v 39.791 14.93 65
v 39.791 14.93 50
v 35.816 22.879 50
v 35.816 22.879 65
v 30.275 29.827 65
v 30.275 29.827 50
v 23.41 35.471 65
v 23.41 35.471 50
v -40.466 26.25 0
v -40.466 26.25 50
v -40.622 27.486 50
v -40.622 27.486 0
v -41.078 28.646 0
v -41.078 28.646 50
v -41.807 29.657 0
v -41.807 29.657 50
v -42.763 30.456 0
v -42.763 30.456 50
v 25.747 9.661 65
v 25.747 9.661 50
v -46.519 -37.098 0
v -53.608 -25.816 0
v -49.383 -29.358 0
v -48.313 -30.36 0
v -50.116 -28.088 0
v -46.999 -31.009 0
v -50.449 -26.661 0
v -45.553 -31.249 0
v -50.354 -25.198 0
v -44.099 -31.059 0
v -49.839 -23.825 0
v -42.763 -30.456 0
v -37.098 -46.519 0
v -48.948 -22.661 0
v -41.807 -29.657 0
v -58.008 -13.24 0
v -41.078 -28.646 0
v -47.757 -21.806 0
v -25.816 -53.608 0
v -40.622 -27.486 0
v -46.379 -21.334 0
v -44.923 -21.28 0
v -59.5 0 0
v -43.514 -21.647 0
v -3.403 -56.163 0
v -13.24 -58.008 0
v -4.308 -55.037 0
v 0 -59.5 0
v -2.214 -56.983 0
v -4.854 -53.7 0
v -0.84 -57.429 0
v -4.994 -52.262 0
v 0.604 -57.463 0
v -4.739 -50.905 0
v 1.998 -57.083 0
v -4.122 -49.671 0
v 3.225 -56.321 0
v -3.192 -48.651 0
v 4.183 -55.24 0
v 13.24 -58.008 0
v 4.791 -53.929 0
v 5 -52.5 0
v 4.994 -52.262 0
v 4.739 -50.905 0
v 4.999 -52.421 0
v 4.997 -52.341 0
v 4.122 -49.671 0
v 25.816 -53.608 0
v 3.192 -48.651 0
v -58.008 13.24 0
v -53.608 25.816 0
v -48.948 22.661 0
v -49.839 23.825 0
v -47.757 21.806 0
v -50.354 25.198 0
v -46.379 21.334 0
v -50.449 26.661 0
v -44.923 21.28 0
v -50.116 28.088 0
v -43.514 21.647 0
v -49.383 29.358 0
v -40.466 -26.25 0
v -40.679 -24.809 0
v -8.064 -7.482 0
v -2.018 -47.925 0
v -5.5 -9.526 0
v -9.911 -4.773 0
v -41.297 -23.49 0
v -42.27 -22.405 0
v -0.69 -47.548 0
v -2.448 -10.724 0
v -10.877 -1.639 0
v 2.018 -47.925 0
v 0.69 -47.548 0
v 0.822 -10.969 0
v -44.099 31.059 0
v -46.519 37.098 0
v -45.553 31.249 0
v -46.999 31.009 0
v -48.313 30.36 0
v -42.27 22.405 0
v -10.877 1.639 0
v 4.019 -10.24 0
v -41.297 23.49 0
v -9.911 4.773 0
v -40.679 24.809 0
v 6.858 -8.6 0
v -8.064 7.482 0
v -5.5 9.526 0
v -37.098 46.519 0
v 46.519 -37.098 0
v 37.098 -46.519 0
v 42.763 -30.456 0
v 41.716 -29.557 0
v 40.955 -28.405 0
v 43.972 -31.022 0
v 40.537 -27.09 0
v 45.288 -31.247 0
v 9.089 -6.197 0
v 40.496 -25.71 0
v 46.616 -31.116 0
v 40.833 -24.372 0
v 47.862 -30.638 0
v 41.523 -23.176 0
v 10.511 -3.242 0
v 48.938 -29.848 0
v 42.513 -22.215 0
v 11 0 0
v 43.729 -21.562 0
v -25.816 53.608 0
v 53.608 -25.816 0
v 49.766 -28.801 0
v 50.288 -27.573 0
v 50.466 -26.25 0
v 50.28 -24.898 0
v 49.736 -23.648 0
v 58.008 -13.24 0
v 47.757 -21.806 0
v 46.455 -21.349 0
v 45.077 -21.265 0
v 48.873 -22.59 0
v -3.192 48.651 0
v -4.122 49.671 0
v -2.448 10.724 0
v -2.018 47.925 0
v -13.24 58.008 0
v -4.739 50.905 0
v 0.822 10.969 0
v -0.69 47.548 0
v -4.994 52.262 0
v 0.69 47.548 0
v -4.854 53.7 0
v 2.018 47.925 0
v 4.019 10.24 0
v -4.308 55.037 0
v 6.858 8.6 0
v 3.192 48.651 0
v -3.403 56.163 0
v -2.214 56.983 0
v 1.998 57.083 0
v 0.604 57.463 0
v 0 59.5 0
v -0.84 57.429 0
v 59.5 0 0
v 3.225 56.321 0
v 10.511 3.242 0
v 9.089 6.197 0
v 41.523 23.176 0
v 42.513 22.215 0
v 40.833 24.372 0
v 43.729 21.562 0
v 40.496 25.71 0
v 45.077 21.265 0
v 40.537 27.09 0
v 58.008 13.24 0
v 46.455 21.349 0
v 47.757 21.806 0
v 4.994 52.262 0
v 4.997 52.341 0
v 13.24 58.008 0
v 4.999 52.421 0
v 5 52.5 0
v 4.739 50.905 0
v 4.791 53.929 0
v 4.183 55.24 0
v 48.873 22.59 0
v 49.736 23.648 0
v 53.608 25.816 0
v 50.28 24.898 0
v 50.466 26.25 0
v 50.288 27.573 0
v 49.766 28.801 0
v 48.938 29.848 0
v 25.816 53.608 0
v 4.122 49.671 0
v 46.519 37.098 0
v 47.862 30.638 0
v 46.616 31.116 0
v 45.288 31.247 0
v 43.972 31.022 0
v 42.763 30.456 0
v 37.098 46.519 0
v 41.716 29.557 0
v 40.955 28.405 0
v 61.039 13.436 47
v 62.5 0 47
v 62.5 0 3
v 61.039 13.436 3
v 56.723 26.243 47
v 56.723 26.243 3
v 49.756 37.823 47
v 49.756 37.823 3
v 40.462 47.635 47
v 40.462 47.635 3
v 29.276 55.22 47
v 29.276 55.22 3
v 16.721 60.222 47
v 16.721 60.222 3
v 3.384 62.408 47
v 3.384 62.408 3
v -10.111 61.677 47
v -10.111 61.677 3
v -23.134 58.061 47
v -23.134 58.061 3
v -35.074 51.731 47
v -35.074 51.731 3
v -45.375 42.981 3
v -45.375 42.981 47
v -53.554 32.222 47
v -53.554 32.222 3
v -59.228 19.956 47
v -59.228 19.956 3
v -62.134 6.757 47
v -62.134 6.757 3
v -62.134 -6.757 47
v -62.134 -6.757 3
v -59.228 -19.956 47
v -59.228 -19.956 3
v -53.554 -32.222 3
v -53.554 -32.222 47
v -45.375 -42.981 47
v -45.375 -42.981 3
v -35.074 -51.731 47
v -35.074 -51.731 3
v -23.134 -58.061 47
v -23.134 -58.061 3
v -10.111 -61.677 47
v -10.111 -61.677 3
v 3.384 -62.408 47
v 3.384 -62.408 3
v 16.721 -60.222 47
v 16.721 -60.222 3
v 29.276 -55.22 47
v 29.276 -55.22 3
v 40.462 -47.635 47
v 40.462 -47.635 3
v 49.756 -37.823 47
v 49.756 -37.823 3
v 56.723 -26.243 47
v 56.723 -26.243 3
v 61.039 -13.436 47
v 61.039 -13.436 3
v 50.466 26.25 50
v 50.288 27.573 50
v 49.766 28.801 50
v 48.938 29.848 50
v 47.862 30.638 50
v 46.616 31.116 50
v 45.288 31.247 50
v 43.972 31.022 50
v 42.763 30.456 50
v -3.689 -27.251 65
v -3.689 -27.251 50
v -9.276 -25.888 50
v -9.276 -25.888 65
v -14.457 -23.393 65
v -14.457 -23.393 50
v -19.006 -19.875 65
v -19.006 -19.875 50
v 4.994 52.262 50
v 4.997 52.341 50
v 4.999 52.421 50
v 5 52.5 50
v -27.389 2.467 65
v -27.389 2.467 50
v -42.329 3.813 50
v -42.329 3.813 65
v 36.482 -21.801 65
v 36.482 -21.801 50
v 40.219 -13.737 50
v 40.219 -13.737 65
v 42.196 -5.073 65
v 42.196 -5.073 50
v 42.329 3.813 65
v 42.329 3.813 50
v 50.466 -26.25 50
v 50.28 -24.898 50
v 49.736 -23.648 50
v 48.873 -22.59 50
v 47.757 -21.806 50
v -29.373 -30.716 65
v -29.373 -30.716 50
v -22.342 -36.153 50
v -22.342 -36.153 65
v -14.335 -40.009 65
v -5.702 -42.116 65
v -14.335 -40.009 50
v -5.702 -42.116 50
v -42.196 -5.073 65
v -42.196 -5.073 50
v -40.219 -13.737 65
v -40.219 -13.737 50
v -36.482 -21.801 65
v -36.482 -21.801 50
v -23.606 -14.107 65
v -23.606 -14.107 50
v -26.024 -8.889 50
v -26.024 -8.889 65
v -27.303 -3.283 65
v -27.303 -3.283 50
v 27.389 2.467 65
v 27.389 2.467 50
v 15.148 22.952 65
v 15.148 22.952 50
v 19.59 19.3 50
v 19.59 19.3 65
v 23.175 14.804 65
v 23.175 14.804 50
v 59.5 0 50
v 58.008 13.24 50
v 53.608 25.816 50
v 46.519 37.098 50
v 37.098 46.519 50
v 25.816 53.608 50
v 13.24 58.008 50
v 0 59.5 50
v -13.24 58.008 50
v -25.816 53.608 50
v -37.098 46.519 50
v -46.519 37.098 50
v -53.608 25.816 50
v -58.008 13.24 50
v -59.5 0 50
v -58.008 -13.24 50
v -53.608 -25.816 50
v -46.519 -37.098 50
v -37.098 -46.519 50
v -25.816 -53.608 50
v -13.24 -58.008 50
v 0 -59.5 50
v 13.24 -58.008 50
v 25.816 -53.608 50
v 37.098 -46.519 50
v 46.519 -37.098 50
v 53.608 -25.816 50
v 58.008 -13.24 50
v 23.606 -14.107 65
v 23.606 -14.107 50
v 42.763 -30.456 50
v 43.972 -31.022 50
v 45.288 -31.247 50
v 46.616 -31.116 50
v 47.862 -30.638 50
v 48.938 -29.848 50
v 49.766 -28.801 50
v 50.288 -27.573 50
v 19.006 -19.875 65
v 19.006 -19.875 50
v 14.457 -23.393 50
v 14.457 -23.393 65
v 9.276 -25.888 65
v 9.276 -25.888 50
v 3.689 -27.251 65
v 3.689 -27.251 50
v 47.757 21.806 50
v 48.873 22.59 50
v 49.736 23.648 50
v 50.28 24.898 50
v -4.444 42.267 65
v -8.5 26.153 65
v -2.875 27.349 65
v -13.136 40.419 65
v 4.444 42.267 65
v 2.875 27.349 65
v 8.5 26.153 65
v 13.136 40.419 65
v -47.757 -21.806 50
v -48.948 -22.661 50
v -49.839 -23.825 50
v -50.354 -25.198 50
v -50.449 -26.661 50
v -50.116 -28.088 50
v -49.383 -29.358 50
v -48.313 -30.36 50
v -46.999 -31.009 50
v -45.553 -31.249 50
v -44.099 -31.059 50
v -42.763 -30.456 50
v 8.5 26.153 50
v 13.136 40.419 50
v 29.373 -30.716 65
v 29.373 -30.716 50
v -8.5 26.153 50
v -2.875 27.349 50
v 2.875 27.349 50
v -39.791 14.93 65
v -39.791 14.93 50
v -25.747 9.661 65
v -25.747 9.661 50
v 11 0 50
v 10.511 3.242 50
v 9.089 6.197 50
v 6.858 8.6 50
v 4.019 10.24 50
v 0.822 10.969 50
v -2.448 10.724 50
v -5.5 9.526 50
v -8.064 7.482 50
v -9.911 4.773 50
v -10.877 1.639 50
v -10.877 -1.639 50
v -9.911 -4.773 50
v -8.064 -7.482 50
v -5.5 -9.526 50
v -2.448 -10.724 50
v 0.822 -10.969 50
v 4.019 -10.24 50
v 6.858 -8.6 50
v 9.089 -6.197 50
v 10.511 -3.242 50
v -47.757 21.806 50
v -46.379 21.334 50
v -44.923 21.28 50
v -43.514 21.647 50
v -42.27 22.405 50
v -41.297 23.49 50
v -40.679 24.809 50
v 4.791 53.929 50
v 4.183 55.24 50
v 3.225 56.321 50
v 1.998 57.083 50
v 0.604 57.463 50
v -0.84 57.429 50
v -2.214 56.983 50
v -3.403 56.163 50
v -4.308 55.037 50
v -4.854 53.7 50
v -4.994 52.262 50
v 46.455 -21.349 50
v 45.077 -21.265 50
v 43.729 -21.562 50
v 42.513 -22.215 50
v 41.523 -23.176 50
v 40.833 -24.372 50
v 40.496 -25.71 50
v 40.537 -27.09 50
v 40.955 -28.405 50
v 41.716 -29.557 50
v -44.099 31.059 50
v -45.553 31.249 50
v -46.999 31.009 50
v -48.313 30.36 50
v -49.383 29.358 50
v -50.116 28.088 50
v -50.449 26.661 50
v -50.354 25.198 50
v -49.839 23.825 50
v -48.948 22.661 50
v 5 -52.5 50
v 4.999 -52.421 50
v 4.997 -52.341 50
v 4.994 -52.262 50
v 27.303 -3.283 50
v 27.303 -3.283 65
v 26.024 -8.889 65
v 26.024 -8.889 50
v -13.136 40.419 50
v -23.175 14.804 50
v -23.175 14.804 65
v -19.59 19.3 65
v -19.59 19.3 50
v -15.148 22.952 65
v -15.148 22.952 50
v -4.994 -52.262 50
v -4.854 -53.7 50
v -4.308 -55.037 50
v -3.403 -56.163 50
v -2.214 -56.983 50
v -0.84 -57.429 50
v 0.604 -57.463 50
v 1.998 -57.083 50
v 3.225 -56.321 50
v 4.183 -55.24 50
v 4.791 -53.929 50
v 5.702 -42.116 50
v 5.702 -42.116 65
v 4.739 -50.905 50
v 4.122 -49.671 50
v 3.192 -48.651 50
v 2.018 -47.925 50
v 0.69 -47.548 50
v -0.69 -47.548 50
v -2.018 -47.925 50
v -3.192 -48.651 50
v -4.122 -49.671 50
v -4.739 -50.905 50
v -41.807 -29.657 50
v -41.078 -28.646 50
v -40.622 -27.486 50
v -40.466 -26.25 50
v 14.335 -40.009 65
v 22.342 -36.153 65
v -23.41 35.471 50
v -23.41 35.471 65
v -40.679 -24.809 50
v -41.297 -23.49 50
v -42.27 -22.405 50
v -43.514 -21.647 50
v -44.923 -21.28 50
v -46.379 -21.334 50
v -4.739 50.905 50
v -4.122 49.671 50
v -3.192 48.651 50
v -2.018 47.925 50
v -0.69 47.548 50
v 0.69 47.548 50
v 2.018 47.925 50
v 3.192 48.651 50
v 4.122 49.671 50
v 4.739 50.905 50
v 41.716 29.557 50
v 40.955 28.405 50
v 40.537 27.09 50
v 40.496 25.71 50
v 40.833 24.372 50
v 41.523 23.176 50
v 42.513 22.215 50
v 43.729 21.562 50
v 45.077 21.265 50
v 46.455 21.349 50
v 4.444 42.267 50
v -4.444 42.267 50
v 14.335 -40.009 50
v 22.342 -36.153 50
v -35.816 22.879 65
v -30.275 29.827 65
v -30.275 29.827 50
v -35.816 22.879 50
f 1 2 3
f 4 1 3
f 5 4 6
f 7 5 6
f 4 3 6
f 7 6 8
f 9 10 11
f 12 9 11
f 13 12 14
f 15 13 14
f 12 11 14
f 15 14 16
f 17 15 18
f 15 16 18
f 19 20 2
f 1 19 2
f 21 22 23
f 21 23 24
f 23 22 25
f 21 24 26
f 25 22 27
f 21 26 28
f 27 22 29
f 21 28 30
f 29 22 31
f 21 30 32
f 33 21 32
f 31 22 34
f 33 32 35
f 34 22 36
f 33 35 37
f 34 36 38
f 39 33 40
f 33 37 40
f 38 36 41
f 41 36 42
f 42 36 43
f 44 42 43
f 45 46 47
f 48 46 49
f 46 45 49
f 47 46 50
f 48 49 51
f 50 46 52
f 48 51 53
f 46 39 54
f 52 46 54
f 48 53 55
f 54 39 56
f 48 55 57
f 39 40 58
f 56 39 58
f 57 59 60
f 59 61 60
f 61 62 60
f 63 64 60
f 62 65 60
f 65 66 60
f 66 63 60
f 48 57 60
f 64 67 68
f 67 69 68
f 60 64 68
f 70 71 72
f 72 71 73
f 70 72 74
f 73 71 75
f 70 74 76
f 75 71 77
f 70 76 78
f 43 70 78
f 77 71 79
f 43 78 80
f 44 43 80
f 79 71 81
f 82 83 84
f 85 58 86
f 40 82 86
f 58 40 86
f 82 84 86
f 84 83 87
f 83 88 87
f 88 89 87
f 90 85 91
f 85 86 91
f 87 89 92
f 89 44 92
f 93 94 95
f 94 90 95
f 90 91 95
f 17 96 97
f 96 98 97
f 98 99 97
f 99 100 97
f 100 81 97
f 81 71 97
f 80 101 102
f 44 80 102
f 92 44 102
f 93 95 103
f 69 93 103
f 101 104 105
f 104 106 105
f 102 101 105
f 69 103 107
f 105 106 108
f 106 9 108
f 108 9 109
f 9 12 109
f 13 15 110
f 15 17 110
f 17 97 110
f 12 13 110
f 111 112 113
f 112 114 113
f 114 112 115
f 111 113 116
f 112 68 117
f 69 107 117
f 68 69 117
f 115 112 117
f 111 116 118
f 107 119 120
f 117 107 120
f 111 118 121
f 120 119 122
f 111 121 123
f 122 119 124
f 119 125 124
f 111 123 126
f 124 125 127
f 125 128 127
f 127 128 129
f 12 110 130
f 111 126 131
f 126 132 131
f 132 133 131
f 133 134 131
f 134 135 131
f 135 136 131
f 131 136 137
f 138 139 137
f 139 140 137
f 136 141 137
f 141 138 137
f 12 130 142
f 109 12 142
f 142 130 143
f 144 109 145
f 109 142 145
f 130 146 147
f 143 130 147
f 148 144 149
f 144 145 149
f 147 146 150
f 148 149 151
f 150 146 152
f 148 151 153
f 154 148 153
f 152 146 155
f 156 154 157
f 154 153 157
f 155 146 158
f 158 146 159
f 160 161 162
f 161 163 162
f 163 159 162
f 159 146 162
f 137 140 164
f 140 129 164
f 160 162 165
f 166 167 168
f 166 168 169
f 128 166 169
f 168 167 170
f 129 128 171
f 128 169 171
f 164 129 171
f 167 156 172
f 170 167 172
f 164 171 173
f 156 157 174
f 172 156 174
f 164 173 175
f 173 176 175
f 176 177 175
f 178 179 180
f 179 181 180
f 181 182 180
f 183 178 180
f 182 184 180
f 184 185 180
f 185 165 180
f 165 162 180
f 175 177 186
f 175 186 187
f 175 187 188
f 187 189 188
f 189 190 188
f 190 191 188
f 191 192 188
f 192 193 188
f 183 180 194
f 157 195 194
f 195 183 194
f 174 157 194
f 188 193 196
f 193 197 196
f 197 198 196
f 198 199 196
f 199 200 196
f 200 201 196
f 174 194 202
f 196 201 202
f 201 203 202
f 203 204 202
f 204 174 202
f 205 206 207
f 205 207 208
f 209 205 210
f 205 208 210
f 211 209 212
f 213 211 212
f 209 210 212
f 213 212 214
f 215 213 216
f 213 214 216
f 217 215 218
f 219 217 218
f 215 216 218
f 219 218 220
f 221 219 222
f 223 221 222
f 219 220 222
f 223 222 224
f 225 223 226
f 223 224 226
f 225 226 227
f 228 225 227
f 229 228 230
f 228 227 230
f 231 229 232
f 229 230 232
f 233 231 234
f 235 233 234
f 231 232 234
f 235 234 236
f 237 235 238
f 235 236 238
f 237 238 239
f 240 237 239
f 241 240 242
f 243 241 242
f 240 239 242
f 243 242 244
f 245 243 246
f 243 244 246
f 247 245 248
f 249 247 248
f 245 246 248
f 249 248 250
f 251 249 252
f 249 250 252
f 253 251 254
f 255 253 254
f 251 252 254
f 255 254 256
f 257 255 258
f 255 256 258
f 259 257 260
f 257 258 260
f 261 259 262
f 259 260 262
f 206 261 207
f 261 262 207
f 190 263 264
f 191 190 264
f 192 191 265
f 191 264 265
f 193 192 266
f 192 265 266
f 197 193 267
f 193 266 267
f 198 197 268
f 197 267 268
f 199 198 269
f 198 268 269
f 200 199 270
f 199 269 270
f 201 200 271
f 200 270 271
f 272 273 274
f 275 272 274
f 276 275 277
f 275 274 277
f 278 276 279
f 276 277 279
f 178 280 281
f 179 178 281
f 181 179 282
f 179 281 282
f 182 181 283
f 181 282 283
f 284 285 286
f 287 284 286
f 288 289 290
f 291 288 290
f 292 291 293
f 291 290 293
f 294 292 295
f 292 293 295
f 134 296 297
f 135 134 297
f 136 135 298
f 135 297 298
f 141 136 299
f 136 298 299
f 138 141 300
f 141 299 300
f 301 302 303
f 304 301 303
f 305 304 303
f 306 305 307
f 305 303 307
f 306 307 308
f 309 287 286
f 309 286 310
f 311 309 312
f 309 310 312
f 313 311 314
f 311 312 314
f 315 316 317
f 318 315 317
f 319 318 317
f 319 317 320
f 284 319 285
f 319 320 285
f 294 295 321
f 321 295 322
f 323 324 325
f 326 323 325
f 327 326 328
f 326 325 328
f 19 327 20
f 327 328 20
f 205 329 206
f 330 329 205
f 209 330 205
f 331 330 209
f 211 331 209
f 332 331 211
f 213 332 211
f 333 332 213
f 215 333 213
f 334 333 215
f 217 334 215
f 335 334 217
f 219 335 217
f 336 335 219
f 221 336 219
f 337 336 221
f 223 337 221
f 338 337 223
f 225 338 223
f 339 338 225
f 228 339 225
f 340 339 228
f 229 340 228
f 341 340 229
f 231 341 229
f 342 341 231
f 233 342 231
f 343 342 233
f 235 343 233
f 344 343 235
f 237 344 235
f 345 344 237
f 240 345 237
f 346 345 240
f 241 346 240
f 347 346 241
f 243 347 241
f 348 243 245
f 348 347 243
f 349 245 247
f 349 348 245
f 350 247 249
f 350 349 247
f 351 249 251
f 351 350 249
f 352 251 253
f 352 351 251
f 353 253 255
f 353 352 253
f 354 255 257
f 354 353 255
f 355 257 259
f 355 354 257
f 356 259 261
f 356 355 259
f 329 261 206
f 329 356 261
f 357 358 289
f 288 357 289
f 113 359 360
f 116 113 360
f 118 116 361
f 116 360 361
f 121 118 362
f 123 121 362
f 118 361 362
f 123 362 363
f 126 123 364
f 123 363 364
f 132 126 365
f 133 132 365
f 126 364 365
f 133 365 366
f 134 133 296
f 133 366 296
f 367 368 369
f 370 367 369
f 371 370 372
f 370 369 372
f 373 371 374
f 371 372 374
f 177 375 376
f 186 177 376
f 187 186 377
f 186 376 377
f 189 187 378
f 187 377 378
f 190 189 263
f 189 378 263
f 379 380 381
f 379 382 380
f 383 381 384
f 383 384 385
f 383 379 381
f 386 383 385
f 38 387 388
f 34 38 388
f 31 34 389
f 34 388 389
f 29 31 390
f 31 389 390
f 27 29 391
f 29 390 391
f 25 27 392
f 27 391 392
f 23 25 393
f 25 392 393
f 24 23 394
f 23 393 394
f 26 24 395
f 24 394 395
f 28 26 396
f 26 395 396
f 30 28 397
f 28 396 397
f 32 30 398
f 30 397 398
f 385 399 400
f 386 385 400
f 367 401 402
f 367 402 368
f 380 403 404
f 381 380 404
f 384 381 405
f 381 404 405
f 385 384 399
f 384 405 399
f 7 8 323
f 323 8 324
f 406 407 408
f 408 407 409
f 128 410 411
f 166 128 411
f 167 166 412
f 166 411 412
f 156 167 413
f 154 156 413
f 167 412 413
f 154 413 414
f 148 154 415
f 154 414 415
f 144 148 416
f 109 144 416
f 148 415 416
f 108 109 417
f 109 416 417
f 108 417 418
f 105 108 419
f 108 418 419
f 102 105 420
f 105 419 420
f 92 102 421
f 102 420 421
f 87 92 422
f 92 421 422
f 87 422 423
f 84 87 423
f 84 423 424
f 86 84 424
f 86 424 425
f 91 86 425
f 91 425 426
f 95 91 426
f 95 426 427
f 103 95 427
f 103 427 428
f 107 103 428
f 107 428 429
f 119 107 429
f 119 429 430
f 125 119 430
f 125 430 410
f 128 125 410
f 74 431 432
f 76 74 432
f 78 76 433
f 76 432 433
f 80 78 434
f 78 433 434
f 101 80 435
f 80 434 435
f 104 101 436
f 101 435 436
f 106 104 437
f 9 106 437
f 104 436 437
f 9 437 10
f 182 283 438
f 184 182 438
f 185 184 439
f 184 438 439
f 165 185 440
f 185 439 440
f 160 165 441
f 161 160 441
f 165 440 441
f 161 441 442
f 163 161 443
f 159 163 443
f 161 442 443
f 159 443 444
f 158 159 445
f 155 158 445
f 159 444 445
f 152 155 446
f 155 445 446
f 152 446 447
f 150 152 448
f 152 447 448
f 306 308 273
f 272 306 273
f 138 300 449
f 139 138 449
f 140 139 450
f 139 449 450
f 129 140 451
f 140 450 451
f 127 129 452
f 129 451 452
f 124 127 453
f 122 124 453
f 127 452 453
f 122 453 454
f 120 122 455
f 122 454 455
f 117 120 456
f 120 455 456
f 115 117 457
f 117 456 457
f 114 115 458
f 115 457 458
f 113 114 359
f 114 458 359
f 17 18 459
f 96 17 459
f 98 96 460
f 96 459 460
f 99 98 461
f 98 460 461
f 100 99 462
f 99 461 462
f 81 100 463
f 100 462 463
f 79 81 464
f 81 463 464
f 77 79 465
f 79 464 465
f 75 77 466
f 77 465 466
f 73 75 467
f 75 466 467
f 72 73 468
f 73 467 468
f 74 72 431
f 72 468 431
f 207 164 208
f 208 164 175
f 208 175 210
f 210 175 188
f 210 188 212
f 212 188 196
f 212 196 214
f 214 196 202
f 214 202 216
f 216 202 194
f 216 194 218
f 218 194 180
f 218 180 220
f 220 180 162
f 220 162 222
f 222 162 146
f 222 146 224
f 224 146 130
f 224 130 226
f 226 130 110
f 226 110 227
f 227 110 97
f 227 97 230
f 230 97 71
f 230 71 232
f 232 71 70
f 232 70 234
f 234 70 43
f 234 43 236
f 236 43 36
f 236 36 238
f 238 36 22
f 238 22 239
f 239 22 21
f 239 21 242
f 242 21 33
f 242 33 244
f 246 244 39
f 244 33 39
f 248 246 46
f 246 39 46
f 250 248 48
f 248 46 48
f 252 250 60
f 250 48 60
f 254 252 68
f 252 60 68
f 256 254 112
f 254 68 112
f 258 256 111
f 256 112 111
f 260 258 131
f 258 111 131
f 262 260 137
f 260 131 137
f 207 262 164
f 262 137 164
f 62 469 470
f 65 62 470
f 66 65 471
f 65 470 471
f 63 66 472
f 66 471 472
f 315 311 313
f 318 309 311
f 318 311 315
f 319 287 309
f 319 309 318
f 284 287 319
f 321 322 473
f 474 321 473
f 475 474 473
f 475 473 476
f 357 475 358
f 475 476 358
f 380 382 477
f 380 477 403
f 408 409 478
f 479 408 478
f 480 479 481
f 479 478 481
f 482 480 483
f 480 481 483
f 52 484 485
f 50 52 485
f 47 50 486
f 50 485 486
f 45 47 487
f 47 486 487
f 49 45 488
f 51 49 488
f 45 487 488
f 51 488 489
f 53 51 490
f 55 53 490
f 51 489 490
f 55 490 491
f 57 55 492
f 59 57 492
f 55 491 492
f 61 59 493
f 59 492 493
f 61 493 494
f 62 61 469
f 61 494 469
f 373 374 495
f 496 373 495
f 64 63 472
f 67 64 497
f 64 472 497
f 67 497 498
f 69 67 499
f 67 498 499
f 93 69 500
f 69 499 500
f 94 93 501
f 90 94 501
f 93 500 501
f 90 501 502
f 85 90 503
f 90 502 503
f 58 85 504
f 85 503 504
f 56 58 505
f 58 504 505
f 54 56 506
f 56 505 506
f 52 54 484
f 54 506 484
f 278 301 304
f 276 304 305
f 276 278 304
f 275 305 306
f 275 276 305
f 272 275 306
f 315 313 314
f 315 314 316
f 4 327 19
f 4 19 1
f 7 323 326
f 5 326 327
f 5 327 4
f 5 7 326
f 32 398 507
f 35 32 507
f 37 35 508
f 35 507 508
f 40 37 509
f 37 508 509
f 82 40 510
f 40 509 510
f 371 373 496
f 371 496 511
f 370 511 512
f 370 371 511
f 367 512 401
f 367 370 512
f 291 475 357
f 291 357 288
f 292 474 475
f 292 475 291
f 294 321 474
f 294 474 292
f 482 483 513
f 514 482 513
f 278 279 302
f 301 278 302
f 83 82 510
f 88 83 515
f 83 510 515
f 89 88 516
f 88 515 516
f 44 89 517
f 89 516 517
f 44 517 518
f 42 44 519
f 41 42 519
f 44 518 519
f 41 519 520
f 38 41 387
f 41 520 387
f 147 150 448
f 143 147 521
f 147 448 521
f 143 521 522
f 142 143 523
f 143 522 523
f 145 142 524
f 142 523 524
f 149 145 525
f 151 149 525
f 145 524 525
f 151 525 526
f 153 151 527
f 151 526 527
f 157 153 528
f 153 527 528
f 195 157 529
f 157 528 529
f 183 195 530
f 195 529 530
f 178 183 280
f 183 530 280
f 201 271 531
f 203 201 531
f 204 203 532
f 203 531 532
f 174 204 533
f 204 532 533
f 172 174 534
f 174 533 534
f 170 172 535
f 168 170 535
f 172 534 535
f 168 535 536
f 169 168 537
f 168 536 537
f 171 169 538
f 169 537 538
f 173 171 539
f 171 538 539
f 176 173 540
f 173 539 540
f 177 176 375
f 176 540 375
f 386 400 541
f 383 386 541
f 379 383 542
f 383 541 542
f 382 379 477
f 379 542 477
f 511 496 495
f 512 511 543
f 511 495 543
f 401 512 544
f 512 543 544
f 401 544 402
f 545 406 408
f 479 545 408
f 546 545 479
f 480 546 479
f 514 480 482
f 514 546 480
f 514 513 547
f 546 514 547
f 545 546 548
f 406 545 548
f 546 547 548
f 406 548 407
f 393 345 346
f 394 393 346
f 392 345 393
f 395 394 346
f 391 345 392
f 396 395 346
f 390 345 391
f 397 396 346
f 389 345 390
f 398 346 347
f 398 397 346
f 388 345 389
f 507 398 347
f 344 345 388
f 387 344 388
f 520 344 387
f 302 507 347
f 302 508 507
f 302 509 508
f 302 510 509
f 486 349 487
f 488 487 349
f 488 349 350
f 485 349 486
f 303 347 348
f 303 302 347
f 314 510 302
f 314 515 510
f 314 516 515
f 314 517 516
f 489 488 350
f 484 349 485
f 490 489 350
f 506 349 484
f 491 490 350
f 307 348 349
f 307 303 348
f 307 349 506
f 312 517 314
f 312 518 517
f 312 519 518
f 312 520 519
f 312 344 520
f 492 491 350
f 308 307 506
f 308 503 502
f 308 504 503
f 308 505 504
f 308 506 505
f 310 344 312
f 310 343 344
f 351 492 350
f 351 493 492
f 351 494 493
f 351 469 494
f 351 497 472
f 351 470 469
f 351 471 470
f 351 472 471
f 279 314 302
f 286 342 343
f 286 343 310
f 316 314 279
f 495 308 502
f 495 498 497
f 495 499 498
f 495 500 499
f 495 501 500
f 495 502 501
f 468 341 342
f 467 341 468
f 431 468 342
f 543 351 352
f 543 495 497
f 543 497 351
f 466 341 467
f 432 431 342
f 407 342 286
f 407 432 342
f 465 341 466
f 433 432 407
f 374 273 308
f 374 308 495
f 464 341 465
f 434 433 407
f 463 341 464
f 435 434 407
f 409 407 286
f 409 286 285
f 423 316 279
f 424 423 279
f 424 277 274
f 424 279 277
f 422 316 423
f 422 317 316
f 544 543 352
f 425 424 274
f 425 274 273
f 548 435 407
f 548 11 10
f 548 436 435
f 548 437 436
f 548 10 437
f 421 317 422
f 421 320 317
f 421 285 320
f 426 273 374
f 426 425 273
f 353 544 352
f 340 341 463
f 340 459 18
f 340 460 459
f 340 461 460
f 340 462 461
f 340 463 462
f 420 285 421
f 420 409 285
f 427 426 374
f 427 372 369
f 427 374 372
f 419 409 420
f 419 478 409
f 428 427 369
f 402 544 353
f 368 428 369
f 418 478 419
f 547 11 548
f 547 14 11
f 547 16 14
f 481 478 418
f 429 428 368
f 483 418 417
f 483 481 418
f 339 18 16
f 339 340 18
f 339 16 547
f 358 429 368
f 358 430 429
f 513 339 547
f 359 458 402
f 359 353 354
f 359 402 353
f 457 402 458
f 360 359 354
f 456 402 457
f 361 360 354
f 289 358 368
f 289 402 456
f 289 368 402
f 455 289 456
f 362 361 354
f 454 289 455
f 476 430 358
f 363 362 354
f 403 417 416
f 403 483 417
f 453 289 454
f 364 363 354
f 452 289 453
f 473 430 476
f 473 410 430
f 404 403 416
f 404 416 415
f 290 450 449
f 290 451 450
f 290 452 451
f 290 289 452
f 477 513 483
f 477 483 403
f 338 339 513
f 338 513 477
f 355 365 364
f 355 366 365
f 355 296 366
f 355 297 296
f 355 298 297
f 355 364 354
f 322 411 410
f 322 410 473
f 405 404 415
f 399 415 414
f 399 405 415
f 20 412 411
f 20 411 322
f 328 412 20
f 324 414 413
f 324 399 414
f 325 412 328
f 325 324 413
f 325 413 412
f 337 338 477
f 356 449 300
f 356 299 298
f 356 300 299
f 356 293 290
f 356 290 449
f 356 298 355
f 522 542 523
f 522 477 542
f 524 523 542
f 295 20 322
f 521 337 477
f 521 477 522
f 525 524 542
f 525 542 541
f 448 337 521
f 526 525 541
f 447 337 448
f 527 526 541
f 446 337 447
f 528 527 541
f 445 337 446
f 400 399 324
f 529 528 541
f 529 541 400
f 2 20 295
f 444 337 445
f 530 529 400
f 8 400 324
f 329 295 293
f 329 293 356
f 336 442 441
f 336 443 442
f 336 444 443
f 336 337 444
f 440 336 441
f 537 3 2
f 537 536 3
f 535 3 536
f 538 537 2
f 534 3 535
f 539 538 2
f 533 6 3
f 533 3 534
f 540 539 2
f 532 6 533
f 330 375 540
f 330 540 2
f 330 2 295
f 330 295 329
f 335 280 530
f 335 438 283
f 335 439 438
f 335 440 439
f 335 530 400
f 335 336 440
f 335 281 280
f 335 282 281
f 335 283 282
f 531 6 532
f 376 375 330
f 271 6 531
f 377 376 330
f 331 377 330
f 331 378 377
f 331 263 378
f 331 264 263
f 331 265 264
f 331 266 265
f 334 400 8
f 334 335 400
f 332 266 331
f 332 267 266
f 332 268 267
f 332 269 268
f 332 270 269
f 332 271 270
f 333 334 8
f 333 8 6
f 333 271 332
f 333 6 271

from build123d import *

# Parameters (mm, degrees)
F0_R     = 62.5
F1_DEPTH = 50
F3_DEPTH = 15
F4_R     = 11
F5_DEPTH = 50.001
F7_DEPTH = 50.001
F8_SIZE  = 3


with BuildPart() as f1:
    # F0 (on Top) → F1 (new body)
    with BuildSketch(Plane.XY):
        Circle(F0_R)
    extrude(amount=F1_DEPTH)

    # F2 (on face) → F3 (join)
    with BuildSketch(Plane.XY.offset(50)):
        with BuildLine():
            ThreePointArc((-8.5, 26.153394), (0, 27.5), (8.5, 26.153394))
            Line((8.5, 26.153394), (13.136364, 40.418881))
            ThreePointArc((13.136364, 40.418881), (0, 42.5), (-13.136364, 40.418881))
            Line((-13.136364, 40.418881), (-8.5, 26.153394))
        make_face()
        with BuildLine():
            Line((-39.791143, 14.930338), (-25.74721, 9.660807))
            ThreePointArc((-25.74721, 9.660807), (-21.500366, 17.14597), (-15.147883, 22.951942))
            Line((-15.147883, 22.951942), (-23.410365, 35.471183))
            ThreePointArc((-23.410365, 35.471183), (-33.227838, 26.498317), (-39.791143, 14.930338))
        make_face()
        with BuildLine():
            Line((-36.482379, -21.801055), (-23.606246, -14.106565))
            ThreePointArc((-23.606246, -14.106565), (-26.810518, -6.119326), (-27.389101, 2.46721))
            Line((-27.389101, 2.46721), (-42.328611, 3.81296))
            ThreePointArc((-42.328611, 3.81296), (-41.434436, -9.45714), (-36.482379, -21.801055))
        make_face()
        with BuildLine():
            Line((-5.701641, -42.115808), (-3.689297, -27.251405))
            ThreePointArc((-3.689297, -27.251405), (-11.931803, -24.776644), (-19.005768, -19.875382))
            Line((-19.005768, -19.875382), (-29.37255, -30.716499))
            ThreePointArc((-29.37255, -30.716499), (-18.440059, -38.291177), (-5.701641, -42.115808))
        make_face()
        with BuildLine():
            Line((29.37255, -30.716499), (19.005768, -19.875382))
            ThreePointArc((19.005768, -19.875382), (11.931803, -24.776644), (3.689297, -27.251405))
            Line((3.689297, -27.251405), (5.701641, -42.115808))
            ThreePointArc((5.701641, -42.115808), (18.440059, -38.291177), (29.37255, -30.716499))
        make_face()
        with BuildLine():
            Line((42.328611, 3.81296), (27.389101, 2.46721))
            ThreePointArc((27.389101, 2.46721), (26.810518, -6.119326), (23.606246, -14.106565))
            Line((23.606246, -14.106565), (36.482379, -21.801055))
            ThreePointArc((36.482379, -21.801055), (41.434436, -9.45714), (42.328611, 3.81296))
        make_face()
        with BuildLine():
            Line((23.410365, 35.471183), (15.147883, 22.951942))
            ThreePointArc((15.147883, 22.951942), (21.500366, 17.14597), (25.74721, 9.660807))
            Line((25.74721, 9.660807), (39.791143, 14.930338))
            ThreePointArc((39.791143, 14.930338), (33.227838, 26.498317), (23.410365, 35.471183))
        make_face()
    extrude(amount=F3_DEPTH)

    # F4 (on face) → F5 (cut, through all)
    with BuildSketch(Plane.XY.offset(50)):
        Circle(F4_R)
    extrude(amount=-F5_DEPTH, mode=Mode.SUBTRACT)

    # F6 (on face) → F7 (cut, through all)
    with BuildSketch(Plane.XY.offset(50)):
        with BuildLine():
            ThreePointArc((-40.466334, 26.25), (-41.077894, 28.646163), (-42.762973, 30.456167))
            ThreePointArc((-42.762973, 30.456167), (-44.164755, 28.385285), (-45.466334, 26.25))
            ThreePointArc((-45.466334, 26.25), (-46.664755, 24.055158), (-47.757301, 21.805738))
            ThreePointArc((-47.757301, 21.805738), (-42.863915, 21.980642), (-40.466334, 26.25))
        make_face()
        with BuildLine():
            ThreePointArc((-45.466334, 26.25), (-44.164755, 28.385285), (-42.762973, 30.456167))
            ThreePointArc((-42.762973, 30.456167), (-49.796461, 28.75), (-47.757301, 21.805738))
            ThreePointArc((-47.757301, 21.805738), (-46.664755, 24.055158), (-45.466334, 26.25))
        make_face()
        with BuildLine():
            ThreePointArc((4.994328, 52.261905), (4.998582, 52.380919), (5, 52.5))
            ThreePointArc((5, 52.5), (-0.119081, 57.498582), (-4.994328, 52.261905))
            ThreePointArc((-4.994328, 52.261905), (0, 52.5), (4.994328, 52.261905))
        make_face()
        with BuildLine():
            ThreePointArc((4.994328, 52.261905), (0, 52.5), (-4.994328, 52.261905))
            ThreePointArc((-4.994328, 52.261905), (0, 47.5), (4.994328, 52.261905))
        make_face()
        with BuildLine():
            ThreePointArc((-42.762973, -30.456167), (-41.077894, -28.646163), (-40.466334, -26.25))
            ThreePointArc((-40.466334, -26.25), (-42.863915, -21.980642), (-47.757301, -21.805738))
            ThreePointArc((-47.757301, -21.805738), (-46.664755, -24.055158), (-45.466334, -26.25))
            ThreePointArc((-45.466334, -26.25), (-44.164755, -28.385285), (-42.762973, -30.456167))
        make_face()
        with BuildLine():
            ThreePointArc((-45.466334, -26.25), (-46.664755, -24.055158), (-47.757301, -21.805738))
            ThreePointArc((-47.757301, -21.805738), (-49.796461, -28.75), (-42.762973, -30.456167))
            ThreePointArc((-42.762973, -30.456167), (-44.164755, -28.385285), (-45.466334, -26.25))
        make_face()
        with BuildLine():
            ThreePointArc((-4.994328, -52.261905), (-0.119081, -57.498582), (5, -52.5))
            ThreePointArc((5, -52.5), (4.998582, -52.380919), (4.994328, -52.261905))
            ThreePointArc((4.994328, -52.261905), (2.5, -52.440442), (0, -52.5))
            ThreePointArc((0, -52.5), (-2.5, -52.440442), (-4.994328, -52.261905))
        make_face()
        with BuildLine():
            ThreePointArc((0, -52.5), (2.5, -52.440442), (4.994328, -52.261905))
            ThreePointArc((4.994328, -52.261905), (0, -47.5), (-4.994328, -52.261905))
            ThreePointArc((-4.994328, -52.261905), (-2.5, -52.440442), (0, -52.5))
        make_face()
        with BuildLine():
            ThreePointArc((42.762973, -30.456167), (47.862497, -30.638439), (50.466334, -26.25))
            ThreePointArc((50.466334, -26.25), (49.735692, -23.647582), (47.757301, -21.805738))
            ThreePointArc((47.757301, -21.805738), (45.466334, -26.25), (42.762973, -30.456167))
        make_face()
        with BuildLine():
            ThreePointArc((42.762973, -30.456167), (45.466334, -26.25), (47.757301, -21.805738))
            ThreePointArc((47.757301, -21.805738), (41.136207, -23.75), (42.762973, -30.456167))
        make_face()
        with BuildLine():
            ThreePointArc((47.757301, 21.805738), (49.735692, 23.647582), (50.466334, 26.25))
            ThreePointArc((50.466334, 26.25), (47.862497, 30.638439), (42.762973, 30.456167))
            ThreePointArc((42.762973, 30.456167), (44.164755, 28.385285), (45.466334, 26.25))
            ThreePointArc((45.466334, 26.25), (46.664755, 24.055158), (47.757301, 21.805738))
        make_face()
        with BuildLine():
            ThreePointArc((45.466334, 26.25), (44.164755, 28.385285), (42.762973, 30.456167))
            ThreePointArc((42.762973, 30.456167), (41.136207, 23.75), (47.757301, 21.805738))
            ThreePointArc((47.757301, 21.805738), (46.664755, 24.055158), (45.466334, 26.25))
        make_face()
    extrude(amount=-F7_DEPTH, mode=Mode.SUBTRACT)

    # F8
    f8_edges = [f1.edges().sort_by_distance(p)[0] for p in [
        (-62.5, 0, 50),
        (-62.5, 0, 0),
    ]]
    chamfer(f8_edges, length=F8_SIZE)


solid = f1.part
